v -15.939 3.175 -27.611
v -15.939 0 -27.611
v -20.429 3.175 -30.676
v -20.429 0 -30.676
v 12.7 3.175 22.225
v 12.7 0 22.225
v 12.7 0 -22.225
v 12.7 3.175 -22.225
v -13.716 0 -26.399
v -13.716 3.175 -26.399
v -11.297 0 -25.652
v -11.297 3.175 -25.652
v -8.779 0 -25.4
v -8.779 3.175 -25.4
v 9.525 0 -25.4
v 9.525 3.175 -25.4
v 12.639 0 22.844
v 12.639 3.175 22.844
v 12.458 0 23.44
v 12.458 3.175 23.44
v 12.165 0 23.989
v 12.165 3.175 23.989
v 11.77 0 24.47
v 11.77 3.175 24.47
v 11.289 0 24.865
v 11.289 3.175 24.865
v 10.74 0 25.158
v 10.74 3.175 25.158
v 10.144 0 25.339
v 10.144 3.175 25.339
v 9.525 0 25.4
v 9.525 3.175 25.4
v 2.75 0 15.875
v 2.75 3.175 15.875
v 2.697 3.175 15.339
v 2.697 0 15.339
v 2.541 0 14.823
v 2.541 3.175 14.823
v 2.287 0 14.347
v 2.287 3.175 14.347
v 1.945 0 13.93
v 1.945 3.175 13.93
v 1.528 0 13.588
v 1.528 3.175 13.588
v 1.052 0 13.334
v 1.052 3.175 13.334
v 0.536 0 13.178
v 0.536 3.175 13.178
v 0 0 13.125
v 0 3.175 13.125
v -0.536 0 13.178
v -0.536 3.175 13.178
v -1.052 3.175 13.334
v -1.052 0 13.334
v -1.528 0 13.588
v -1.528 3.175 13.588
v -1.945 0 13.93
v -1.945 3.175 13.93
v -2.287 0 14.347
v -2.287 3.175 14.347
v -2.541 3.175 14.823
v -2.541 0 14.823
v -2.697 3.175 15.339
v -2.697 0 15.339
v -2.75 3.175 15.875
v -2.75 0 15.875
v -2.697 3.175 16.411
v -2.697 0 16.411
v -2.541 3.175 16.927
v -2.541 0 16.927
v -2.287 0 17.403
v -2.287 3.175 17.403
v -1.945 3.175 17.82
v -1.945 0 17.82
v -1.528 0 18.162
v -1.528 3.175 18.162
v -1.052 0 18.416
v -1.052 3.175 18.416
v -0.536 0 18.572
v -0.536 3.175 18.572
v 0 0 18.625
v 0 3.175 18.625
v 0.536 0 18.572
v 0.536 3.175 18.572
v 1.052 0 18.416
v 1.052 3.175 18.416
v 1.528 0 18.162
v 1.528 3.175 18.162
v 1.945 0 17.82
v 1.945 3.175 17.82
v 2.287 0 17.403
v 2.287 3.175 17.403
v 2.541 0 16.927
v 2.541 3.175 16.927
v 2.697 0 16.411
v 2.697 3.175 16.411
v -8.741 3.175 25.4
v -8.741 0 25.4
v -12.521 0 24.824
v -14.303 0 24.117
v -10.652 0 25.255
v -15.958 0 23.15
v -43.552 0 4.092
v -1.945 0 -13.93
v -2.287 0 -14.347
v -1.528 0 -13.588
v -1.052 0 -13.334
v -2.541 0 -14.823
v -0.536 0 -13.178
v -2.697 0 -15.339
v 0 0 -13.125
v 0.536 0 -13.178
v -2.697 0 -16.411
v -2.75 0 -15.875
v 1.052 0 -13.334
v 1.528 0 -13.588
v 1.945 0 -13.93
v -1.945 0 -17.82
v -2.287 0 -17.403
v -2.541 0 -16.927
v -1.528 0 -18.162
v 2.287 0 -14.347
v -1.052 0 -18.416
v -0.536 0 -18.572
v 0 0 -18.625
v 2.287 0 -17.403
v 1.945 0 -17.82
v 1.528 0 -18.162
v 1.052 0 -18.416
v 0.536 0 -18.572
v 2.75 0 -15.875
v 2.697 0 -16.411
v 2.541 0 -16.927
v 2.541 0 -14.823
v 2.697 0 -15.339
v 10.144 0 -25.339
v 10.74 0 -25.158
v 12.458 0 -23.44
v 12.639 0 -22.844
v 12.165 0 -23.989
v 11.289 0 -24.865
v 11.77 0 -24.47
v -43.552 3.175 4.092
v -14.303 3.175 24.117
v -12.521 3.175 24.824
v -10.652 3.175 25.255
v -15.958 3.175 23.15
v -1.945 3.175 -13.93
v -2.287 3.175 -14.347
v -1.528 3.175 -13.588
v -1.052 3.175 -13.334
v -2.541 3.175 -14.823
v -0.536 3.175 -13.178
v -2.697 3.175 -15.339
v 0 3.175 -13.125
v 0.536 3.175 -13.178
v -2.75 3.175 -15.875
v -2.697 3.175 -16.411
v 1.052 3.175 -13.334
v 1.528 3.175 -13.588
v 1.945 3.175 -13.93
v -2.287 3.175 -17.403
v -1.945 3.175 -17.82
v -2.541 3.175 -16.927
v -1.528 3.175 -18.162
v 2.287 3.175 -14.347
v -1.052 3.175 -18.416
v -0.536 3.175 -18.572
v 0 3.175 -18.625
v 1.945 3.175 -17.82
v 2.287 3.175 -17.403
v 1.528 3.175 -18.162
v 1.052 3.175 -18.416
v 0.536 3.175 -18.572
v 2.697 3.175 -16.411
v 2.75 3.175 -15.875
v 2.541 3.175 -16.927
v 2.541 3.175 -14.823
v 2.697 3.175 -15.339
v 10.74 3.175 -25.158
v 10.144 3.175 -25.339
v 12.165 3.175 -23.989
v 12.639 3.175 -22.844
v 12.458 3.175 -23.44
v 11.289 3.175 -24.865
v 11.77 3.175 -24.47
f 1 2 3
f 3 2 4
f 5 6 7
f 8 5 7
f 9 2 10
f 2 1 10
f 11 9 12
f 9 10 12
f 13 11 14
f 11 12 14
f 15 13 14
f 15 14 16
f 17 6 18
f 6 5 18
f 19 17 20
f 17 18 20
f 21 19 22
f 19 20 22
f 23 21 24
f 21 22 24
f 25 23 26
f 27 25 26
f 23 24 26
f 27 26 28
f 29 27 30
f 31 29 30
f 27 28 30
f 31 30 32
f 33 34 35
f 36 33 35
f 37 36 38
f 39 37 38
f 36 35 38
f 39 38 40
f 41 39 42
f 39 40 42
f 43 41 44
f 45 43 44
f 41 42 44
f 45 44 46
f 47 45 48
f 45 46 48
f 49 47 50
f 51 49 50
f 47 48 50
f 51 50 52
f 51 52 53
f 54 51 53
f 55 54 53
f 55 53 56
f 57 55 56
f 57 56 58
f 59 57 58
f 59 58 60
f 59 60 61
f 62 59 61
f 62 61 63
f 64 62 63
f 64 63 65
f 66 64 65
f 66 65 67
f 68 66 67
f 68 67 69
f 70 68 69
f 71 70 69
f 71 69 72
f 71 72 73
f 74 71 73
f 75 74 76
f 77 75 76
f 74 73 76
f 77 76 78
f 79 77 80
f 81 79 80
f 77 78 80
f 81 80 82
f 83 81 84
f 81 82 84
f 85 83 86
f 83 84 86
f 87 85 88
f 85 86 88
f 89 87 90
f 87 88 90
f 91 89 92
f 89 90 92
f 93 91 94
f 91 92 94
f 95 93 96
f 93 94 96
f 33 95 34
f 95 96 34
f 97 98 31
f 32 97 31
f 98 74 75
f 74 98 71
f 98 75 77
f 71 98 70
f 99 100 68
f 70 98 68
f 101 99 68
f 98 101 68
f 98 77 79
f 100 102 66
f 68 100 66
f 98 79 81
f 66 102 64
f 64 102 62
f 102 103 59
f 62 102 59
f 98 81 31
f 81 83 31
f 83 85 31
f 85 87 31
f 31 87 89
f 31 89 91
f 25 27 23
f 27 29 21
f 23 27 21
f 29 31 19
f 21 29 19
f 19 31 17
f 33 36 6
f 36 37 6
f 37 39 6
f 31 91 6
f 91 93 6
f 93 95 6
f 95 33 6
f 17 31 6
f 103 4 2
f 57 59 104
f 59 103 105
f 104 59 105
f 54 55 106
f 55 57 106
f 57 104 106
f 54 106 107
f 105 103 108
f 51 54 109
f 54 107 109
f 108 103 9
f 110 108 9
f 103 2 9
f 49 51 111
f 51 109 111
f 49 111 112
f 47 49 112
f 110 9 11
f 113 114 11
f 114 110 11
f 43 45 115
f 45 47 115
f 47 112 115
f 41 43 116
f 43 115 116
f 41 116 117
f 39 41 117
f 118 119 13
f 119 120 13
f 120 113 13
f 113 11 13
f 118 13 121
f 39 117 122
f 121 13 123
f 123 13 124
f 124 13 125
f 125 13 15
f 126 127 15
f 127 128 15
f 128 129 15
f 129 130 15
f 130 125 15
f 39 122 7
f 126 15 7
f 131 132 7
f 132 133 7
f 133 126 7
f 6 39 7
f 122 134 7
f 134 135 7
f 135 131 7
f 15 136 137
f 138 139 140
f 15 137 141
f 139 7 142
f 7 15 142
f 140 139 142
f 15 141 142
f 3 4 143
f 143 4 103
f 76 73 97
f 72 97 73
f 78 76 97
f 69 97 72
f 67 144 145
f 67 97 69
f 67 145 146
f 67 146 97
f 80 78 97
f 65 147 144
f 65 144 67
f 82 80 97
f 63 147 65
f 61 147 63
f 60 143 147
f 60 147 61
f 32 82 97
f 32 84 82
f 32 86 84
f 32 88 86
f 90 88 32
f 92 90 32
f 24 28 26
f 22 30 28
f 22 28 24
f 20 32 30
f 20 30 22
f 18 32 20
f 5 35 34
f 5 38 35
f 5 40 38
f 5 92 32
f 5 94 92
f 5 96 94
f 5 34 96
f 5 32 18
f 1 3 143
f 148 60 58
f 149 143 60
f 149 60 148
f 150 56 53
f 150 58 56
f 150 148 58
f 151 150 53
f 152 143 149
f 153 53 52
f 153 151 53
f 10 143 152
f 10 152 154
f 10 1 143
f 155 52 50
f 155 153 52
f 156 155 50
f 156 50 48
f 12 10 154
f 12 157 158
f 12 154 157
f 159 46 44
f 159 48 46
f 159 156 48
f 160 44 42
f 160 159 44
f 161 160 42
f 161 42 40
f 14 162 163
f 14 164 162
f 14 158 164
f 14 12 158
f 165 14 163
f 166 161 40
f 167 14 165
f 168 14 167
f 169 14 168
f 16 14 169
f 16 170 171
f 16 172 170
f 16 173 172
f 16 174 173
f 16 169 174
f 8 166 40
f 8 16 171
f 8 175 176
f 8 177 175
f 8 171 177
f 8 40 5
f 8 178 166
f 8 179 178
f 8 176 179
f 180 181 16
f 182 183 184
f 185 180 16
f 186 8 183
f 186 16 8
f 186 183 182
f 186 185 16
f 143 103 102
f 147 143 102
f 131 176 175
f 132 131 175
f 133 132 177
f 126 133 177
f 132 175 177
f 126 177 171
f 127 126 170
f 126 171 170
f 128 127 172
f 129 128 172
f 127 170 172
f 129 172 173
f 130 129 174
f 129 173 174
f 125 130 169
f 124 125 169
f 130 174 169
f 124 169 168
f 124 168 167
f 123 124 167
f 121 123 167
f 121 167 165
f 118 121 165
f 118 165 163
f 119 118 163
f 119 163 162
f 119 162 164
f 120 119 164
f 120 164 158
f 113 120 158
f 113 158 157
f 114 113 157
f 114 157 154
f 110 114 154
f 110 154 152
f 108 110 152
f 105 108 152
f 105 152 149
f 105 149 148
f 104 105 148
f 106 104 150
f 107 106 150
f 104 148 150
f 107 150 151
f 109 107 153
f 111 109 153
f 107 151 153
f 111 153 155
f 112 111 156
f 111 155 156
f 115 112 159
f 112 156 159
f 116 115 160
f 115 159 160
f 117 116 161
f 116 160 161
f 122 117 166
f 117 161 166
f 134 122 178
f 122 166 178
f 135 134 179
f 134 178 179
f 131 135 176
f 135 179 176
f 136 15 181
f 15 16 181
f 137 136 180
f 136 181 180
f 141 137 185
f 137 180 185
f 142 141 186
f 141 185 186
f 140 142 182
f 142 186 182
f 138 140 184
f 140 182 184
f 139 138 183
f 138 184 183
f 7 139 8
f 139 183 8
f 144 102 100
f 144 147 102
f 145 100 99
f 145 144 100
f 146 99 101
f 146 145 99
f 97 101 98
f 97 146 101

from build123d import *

# Parameters (mm, degrees)
SKETCH1_W                = 25.4
SKETCH1_H                = 50.8
BOSS_EXTRUDE1_DEPTH      = 3.175
M5_CLEARANCE_HOLE1_D     = 5.5
M5_CLEARANCE_HOLE1_DEPTH = 12.7
M5_CLEARANCE_HOLE1_TIP   = 1.652366702
FILLET1_R                = 12.7
FILLET2_R                = 3.175


with BuildPart() as part:
    # Sketch1 → Boss-Extrude1 (new body)
    with BuildSketch(Plane(origin=(0, 0, 0), x_dir=(1, 0, 0), z_dir=(0, 1, 0))):
        Polygon((-12.7, 25.4), (-20.429044148, 30.6757697), (-43.552280389, -4.091606348), (-12.7, -25.4), align=None)
        Rectangle(SKETCH1_W, SKETCH1_H)
    extrude(amount=BOSS_EXTRUDE1_DEPTH)

    # M5 Clearance Hole1
    with Locations(Plane(origin=(0, 0, 0), x_dir=(-1, 0, 0), z_dir=(0, -1, 0))):
        with Locations((0, 15.875), (0, -15.875)):
            Hole(M5_CLEARANCE_HOLE1_D / 2, depth=M5_CLEARANCE_HOLE1_DEPTH)
            with Locations((0, 0, -(M5_CLEARANCE_HOLE1_DEPTH + M5_CLEARANCE_HOLE1_TIP / 2))):  # 118° drill point
                Cone(0, M5_CLEARANCE_HOLE1_D / 2, M5_CLEARANCE_HOLE1_TIP, mode=Mode.SUBTRACT)

    # Fillet1
    fillet1_edges = [part.edges().sort_by_distance(p)[0] for p in [
        (-12.7, 1.5875, -25.4),
        (-12.7, 1.5875, 25.4),
    ]]
    fillet(fillet1_edges, radius=FILLET1_R)

    # Fillet2
    fillet2_edges = [part.edges().sort_by_distance(p)[0] for p in [
        (12.7, 1.5875, -25.4),
        (12.7, 1.5875, 25.4),
    ]]
    fillet(fillet2_edges, radius=FILLET2_R)


solid = part.part
